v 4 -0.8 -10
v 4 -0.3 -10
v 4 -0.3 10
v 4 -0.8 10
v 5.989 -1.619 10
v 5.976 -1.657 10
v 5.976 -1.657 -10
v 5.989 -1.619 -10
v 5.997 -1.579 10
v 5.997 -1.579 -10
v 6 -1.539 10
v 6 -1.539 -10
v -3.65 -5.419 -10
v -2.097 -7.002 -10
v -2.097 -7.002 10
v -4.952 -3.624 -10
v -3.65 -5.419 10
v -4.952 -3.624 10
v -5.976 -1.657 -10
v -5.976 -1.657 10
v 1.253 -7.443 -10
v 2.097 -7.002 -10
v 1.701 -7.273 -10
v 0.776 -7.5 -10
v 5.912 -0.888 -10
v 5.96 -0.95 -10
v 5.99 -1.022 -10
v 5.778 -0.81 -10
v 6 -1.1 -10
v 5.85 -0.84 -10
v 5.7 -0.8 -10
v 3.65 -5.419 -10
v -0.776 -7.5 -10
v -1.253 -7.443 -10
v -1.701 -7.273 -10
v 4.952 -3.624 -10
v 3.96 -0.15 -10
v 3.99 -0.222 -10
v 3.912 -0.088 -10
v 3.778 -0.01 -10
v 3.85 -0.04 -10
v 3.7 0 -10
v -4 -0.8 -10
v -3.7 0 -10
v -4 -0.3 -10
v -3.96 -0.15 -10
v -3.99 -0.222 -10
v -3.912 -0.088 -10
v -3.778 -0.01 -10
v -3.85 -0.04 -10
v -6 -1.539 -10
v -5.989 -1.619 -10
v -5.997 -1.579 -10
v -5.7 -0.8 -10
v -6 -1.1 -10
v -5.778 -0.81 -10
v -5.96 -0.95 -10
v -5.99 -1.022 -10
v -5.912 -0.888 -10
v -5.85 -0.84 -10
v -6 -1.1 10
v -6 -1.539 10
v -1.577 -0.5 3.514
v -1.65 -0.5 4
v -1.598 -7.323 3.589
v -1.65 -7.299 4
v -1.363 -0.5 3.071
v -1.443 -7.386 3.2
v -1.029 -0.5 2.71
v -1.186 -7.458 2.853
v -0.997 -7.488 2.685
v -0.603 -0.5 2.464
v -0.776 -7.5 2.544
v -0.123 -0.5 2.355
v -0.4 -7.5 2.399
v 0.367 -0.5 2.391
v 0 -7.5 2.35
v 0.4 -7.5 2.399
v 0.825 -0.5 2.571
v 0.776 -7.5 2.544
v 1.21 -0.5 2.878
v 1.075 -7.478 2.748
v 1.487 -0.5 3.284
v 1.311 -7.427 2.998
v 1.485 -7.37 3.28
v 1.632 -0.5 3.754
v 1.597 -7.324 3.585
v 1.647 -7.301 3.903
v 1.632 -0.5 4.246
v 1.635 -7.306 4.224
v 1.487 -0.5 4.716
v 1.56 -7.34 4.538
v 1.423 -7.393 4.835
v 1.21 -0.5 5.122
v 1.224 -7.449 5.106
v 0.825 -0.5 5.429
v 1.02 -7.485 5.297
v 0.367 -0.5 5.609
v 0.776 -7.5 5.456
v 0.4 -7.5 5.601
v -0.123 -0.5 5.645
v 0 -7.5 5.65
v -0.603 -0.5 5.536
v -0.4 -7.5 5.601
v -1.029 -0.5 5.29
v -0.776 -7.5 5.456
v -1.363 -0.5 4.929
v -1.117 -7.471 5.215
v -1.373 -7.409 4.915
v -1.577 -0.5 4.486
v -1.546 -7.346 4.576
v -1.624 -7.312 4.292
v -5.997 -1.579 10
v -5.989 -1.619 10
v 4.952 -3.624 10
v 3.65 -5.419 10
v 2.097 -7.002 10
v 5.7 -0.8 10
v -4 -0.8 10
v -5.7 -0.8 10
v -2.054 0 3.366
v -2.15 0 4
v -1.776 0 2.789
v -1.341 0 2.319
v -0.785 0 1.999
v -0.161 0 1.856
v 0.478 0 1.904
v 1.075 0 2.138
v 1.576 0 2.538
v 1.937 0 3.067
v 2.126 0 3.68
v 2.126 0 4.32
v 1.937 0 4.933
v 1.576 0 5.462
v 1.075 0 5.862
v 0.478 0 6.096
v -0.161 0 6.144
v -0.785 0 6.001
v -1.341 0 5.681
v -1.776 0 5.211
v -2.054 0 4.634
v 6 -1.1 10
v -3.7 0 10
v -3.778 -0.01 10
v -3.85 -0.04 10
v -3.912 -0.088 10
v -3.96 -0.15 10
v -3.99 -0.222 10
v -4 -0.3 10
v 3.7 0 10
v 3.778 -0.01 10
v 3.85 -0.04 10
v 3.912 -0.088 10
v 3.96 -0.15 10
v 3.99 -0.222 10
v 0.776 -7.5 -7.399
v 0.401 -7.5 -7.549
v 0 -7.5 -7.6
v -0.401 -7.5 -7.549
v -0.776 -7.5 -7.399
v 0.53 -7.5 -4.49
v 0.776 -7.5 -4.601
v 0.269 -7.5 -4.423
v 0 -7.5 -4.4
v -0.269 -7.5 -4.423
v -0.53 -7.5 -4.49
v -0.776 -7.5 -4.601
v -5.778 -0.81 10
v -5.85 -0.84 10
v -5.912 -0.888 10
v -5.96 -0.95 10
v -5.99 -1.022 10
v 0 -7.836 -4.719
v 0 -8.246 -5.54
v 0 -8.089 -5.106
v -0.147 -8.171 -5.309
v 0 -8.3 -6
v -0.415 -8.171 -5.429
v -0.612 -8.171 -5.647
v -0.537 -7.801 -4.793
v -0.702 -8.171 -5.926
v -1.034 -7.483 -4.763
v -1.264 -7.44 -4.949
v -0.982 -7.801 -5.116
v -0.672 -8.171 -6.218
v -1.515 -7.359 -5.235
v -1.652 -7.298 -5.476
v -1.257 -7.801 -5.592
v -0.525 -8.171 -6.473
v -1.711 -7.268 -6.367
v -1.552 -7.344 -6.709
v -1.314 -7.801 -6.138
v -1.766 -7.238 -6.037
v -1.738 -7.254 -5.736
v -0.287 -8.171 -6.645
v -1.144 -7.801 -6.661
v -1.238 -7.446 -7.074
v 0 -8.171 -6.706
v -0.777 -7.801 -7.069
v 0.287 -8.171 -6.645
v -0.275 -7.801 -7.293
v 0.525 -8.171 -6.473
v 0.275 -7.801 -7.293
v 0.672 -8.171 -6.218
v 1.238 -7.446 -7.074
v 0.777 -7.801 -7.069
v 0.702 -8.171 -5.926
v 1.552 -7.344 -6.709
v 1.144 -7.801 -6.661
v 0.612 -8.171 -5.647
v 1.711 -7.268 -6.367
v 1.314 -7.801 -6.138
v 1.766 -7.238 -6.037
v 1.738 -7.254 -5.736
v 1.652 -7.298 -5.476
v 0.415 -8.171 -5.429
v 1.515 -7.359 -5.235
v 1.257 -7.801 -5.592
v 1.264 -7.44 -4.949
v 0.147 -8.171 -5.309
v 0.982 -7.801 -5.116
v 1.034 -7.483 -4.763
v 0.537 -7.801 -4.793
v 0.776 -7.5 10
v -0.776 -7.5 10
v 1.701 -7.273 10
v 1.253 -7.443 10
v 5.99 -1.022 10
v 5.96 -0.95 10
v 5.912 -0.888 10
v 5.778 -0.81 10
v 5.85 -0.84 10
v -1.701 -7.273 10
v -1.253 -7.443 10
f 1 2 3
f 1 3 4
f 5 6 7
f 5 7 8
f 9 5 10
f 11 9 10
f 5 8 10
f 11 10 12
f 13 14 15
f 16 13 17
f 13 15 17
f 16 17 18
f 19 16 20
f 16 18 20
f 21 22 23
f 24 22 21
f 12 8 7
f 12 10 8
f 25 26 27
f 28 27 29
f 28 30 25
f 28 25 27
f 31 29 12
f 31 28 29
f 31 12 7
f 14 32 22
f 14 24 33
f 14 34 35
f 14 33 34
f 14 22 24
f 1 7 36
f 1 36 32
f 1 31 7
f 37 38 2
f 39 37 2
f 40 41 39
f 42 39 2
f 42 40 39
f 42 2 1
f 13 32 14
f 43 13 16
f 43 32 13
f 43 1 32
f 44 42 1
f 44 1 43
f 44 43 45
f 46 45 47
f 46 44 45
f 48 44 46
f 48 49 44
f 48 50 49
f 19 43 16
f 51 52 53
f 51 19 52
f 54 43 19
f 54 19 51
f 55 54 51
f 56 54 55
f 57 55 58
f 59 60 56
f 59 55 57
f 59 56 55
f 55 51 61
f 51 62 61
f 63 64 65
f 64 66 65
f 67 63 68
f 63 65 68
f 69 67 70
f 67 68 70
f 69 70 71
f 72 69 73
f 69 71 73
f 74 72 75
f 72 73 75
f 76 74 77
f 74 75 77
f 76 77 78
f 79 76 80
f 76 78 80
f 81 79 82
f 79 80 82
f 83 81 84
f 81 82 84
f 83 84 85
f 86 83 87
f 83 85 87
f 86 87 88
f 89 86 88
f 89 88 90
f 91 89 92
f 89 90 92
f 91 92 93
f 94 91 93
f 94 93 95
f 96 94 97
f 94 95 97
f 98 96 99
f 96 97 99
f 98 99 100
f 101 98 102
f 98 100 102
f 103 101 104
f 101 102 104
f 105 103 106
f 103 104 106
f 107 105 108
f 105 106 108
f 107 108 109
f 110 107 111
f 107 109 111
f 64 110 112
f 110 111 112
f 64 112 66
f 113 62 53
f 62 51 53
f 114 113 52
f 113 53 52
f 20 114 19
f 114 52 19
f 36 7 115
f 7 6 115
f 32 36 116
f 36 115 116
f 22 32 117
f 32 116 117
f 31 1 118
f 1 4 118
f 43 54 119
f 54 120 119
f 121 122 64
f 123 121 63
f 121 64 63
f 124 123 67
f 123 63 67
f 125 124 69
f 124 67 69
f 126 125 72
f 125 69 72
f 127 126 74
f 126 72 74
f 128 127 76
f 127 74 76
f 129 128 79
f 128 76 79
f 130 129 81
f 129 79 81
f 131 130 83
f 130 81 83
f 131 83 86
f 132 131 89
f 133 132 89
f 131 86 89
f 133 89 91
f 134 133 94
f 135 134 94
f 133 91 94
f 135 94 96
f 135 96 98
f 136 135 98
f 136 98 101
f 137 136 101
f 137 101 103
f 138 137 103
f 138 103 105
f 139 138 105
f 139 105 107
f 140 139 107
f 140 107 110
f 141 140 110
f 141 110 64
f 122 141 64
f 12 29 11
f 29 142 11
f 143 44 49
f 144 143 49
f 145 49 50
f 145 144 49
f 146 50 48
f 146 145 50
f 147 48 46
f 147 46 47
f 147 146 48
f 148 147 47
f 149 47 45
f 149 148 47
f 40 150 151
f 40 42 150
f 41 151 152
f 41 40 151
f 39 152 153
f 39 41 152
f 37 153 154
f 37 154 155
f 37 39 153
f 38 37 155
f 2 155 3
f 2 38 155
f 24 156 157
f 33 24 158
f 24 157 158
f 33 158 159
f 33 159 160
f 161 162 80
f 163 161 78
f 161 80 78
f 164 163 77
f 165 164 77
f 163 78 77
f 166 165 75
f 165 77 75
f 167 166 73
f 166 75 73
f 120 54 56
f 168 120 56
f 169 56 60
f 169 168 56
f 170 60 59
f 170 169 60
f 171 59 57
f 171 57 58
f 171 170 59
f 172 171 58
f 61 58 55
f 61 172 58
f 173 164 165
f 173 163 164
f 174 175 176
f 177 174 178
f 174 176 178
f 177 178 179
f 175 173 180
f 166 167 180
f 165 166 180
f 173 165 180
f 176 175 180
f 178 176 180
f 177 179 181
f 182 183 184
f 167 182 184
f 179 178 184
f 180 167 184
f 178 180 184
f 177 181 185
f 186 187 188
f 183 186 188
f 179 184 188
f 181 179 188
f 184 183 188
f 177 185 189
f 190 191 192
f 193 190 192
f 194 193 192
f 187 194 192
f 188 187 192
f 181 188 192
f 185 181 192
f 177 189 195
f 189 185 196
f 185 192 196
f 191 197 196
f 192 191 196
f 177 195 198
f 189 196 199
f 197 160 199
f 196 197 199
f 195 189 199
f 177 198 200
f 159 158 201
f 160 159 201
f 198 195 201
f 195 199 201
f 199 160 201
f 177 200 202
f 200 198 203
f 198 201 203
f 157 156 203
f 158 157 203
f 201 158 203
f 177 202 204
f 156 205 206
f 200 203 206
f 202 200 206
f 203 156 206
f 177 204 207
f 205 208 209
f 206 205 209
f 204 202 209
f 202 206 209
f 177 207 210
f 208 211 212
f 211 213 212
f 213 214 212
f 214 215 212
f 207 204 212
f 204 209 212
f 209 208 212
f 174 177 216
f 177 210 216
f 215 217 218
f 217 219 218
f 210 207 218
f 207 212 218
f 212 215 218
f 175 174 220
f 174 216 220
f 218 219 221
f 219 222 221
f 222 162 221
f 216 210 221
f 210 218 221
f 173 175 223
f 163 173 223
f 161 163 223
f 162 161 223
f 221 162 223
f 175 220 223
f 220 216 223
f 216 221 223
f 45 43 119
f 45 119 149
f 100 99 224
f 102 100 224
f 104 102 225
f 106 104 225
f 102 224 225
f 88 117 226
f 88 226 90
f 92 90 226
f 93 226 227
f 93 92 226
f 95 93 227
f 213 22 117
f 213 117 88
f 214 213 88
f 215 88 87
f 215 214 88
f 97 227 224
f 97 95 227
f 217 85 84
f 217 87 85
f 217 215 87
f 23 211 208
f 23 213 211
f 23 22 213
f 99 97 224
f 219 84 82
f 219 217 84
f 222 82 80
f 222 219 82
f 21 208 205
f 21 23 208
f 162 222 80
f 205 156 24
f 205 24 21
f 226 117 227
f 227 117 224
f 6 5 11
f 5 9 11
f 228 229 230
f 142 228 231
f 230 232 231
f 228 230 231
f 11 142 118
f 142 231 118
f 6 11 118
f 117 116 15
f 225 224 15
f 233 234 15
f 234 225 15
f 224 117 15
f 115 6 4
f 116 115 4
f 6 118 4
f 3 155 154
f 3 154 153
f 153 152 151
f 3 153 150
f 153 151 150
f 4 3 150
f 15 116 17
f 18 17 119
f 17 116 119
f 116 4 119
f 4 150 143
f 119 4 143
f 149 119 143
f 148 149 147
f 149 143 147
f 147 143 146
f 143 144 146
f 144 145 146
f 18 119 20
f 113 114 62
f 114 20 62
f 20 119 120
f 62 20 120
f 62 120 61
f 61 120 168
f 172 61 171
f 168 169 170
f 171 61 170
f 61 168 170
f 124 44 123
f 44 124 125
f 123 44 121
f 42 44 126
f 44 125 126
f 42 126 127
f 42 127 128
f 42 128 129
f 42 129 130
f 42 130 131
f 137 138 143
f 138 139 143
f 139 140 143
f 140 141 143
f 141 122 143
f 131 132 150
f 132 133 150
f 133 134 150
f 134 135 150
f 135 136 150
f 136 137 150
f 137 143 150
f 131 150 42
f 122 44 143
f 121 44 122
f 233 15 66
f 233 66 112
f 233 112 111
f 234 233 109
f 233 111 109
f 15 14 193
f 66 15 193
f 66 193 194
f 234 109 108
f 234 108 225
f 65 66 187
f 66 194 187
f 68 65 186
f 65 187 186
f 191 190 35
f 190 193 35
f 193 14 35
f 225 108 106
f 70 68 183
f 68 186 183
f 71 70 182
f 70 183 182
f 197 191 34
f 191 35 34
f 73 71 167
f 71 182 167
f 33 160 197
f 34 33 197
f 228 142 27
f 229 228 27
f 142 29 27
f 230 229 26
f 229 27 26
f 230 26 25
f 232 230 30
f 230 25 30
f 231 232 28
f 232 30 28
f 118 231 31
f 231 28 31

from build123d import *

# Parameters (mm, degrees)
EXTRUDE_1_DEPTH             = 10
FILLET_1_R                  = 0.3
FILLET_2_R                  = 2
HOLE_WIZARD_M41_D           = 3.3
HOLE_WIZARD_M41_CSINK_D     = 4.3
HOLE_WIZARD_M41_CSINK_ANGLE = 90


with BuildPart() as part:
    # Эскиз1 → Бобышка-Вытянуть1 (new body, symmetric)
    with BuildSketch(Plane.XY):
        with BuildLine():
            Line((-4, 0), (4, 0))
            Line((4, 0), (4, -0.8))
            Line((4, -0.8), (6, -0.8))
            Line((6, -0.8), (6, -1.6))
            ThreePointArc((6, -1.6), (4.120585945, -4.832650297), (1.5, -7.5))
            Line((1.5, -7.5), (-1.5, -7.5))
            ThreePointArc((-1.5, -7.5), (-4.120585945, -4.832650297), (-6, -1.6))
            Line((-6, -1.6), (-6, -0.8))
            Line((-6, -0.8), (-4, -0.8))
            Line((-4, -0.8), (-4, 0))
        make_face()
    extrude(amount=EXTRUDE_1_DEPTH, both=True)

    # Скругление1
    fillet_1_edges = [part.edges().sort_by_distance(p)[0] for p in [
        (6, -0.8, 0),
        (6, -1.6, 0),
        (-6, -1.6, 0),
        (-6, -0.8, 0),
        (-4, 0, 0),
        (4, 0, 0),
    ]]
    fillet(fillet_1_edges, radius=FILLET_1_R)

    # Скругление2
    fillet_2_edges = [part.edges().sort_by_distance(p)[0] for p in [
        (1.5, -7.5, 0),
        (-1.5, -7.5, 0),
    ]]
    fillet(fillet_2_edges, radius=FILLET_2_R)

    # Отверстие обработанное метчиком M41 (through all)
    with Locations(Plane(origin=(0, 0, 0), x_dir=(1, 0, 0), z_dir=(0, 1, 0))):
        with Locations((0, -4)):
            CounterSinkHole(HOLE_WIZARD_M41_D / 2, HOLE_WIZARD_M41_CSINK_D / 2, counter_sink_angle=HOLE_WIZARD_M41_CSINK_ANGLE)

    # Эскиз5 → Повернуть1 (revolve)
    with BuildSketch(Plane(origin=(0, 0, 0), x_dir=(0, 0, -1), z_dir=(1, 0, 0))):
        with BuildLine():
            Line((6, -4.3), (6, -8.3))
            ThreePointArc((6, -8.3), (4, -6.3), (6, -4.3))
        make_face()
    revolve(axis=Axis((0, -4.3, -6), (0, -1, 0)))


solid = part.part
